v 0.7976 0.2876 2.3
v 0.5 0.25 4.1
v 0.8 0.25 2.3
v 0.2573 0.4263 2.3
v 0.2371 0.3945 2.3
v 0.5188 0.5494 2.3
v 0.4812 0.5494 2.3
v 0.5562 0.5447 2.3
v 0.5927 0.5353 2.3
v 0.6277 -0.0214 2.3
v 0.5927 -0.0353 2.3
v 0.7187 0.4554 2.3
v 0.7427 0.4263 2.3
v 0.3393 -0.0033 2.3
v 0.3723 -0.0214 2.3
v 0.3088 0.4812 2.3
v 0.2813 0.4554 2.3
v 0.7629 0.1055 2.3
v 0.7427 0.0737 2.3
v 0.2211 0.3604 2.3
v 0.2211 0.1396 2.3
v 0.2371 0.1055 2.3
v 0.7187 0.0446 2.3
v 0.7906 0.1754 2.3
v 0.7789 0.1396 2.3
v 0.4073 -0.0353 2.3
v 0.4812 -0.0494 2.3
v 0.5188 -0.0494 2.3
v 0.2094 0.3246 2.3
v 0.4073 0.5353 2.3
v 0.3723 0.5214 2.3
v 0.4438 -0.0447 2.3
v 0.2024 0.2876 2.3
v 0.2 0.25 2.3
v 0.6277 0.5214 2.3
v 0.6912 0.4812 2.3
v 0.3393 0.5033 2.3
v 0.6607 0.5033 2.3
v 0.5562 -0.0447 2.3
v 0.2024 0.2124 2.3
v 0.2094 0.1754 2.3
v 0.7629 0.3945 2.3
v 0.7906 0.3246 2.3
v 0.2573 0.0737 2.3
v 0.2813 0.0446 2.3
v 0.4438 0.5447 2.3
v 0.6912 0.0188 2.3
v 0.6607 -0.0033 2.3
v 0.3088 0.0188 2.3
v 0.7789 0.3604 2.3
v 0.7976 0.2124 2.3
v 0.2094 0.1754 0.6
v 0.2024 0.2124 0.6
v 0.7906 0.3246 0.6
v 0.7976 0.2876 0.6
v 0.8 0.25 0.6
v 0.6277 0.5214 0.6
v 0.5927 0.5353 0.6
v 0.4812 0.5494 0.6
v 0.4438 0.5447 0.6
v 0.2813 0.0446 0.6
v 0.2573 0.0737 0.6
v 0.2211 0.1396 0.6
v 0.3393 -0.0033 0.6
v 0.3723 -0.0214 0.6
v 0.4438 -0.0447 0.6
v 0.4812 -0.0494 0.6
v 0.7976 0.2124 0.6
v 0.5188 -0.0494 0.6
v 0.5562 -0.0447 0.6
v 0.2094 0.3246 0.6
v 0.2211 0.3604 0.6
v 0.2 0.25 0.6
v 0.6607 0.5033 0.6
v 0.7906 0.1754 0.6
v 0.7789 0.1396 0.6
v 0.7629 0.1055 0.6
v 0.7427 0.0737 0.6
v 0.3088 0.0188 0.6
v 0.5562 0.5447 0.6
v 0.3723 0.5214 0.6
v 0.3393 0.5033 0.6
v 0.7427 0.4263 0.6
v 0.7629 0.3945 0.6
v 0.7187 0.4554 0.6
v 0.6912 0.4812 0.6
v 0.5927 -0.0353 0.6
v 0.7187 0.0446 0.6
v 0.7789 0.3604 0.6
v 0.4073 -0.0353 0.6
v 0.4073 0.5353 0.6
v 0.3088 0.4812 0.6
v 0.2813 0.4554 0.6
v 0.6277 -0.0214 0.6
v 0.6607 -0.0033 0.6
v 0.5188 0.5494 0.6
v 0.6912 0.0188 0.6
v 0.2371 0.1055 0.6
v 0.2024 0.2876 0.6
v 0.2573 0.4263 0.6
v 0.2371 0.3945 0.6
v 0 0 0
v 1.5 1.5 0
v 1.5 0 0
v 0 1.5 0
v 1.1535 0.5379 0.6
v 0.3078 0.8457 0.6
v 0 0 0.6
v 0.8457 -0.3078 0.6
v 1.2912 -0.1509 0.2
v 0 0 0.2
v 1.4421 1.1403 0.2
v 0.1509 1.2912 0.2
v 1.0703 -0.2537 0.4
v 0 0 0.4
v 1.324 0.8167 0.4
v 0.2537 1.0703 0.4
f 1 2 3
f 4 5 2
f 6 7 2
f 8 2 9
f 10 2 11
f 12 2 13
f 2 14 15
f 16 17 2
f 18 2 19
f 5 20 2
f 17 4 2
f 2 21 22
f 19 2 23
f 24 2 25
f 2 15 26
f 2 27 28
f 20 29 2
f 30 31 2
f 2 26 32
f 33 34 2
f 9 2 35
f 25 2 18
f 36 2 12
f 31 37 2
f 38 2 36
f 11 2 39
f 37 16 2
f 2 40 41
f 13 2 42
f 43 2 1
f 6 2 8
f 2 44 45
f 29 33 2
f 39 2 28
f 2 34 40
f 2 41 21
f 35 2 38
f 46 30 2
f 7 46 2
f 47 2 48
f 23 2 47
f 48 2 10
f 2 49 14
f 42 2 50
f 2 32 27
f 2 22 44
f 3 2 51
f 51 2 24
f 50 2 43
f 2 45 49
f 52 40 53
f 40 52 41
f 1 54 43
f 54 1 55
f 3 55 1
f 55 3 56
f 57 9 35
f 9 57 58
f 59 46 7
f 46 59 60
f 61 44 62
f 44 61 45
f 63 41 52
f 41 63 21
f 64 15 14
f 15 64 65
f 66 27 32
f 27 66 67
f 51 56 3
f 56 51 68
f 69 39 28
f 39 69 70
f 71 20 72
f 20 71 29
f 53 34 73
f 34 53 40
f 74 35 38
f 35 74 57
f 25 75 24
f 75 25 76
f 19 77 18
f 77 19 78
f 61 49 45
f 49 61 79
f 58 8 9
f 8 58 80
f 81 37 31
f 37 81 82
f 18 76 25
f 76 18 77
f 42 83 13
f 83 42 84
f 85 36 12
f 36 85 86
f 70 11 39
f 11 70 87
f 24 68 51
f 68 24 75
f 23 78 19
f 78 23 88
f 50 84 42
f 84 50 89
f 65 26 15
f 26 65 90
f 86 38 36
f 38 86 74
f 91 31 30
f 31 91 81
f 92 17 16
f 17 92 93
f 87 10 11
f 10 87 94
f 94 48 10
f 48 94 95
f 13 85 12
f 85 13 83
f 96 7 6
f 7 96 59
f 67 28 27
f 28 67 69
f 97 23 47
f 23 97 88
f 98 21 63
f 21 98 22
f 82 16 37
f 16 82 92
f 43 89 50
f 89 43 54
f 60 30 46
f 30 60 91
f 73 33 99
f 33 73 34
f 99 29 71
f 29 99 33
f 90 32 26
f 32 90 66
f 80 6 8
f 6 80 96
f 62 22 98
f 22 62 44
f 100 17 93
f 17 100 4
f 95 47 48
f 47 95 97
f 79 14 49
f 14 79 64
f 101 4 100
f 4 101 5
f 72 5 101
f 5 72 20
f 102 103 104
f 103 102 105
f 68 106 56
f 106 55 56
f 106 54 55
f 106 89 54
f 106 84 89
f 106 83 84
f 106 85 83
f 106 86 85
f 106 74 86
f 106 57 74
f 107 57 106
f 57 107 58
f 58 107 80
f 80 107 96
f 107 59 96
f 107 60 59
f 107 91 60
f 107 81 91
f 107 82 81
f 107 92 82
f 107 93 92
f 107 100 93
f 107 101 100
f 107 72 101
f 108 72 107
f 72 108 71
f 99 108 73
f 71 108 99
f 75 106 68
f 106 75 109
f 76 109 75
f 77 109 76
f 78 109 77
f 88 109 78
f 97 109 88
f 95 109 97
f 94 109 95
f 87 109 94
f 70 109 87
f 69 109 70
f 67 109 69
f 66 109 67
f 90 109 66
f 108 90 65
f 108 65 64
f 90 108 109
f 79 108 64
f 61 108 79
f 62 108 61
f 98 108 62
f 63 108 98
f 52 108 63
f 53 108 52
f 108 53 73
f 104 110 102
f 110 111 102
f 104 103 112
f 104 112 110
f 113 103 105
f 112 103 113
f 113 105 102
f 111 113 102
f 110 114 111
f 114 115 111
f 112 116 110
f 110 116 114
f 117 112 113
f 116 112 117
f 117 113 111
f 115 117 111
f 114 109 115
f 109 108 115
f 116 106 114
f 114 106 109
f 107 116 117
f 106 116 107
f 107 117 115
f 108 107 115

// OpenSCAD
$fn=50;

scale([1.5, 1.5, 2])
linear_extrude(height=0.3, convexity=10, twist=20, scale=0.6)
square();

translate([0.5, 0.25, 0.3])
scale([0.75, 0.75, 2]) {
  rad =0.4;
  height=1;
  translate([0, 0, height])
    scale([1, 1, 3])
    cylinder(0.3, rad, 0.0);
  cylinder(height, rad, rad);
}
